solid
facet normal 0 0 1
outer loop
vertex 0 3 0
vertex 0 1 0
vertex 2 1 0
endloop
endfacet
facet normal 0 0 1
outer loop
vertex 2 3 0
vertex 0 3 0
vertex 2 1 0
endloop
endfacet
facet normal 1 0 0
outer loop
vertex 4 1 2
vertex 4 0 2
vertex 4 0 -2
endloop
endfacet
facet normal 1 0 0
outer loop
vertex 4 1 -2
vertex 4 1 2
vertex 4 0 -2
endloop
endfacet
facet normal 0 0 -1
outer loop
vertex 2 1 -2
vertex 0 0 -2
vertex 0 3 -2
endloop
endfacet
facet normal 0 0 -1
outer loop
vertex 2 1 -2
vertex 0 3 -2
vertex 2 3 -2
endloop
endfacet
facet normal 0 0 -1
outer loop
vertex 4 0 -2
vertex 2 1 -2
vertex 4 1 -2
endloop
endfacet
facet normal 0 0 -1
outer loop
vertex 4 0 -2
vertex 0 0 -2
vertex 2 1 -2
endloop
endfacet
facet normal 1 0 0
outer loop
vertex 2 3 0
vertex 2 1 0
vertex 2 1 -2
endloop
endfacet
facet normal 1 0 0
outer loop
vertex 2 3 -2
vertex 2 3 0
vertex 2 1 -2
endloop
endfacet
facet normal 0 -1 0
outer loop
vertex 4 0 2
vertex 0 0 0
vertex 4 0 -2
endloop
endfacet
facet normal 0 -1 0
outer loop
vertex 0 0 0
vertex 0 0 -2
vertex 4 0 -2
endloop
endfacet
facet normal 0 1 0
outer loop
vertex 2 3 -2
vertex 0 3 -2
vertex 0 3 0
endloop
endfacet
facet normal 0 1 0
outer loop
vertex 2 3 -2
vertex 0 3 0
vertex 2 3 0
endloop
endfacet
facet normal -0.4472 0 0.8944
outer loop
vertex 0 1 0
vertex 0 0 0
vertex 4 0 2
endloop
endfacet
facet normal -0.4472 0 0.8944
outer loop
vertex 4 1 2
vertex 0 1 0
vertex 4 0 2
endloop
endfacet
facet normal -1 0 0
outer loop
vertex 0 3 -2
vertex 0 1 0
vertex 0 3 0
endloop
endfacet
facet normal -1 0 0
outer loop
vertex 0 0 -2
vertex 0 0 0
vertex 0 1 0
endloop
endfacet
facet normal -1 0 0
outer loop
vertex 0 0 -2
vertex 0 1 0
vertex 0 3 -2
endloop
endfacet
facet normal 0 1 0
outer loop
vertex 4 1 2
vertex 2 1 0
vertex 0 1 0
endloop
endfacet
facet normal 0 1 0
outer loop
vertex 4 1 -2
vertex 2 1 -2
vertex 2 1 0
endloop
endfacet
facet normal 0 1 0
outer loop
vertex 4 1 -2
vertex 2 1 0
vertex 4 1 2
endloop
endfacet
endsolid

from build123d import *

# Parameters (mm, degrees)
SKETCH_1_W      = 2
SKETCH_1_H      = 2
EXTRUDE_1_DEPTH = 3
EXTRUDE_2_DEPTH = 1


with BuildPart() as part:
    # 草圖1 → 填料-伸長1 (new body)
    with BuildSketch(Plane(origin=(0, 0, 0), x_dir=(1, 0, 0), z_dir=(0, 1, 0))):
        with Locations((1, 1)):
            Rectangle(SKETCH_1_W, SKETCH_1_H)
    extrude(amount=EXTRUDE_1_DEPTH)

    # 草圖1<3> → 填料-伸長2 (add)
    with BuildSketch(Plane(origin=(0, 0, 0), x_dir=(1, 0, 0), z_dir=(0, 1, 0))):
        Polygon((2, 0), (0, 0), (4, -2), (4, 2), (2, 2), align=None)
    extrude(amount=EXTRUDE_2_DEPTH)


solid = part.part
